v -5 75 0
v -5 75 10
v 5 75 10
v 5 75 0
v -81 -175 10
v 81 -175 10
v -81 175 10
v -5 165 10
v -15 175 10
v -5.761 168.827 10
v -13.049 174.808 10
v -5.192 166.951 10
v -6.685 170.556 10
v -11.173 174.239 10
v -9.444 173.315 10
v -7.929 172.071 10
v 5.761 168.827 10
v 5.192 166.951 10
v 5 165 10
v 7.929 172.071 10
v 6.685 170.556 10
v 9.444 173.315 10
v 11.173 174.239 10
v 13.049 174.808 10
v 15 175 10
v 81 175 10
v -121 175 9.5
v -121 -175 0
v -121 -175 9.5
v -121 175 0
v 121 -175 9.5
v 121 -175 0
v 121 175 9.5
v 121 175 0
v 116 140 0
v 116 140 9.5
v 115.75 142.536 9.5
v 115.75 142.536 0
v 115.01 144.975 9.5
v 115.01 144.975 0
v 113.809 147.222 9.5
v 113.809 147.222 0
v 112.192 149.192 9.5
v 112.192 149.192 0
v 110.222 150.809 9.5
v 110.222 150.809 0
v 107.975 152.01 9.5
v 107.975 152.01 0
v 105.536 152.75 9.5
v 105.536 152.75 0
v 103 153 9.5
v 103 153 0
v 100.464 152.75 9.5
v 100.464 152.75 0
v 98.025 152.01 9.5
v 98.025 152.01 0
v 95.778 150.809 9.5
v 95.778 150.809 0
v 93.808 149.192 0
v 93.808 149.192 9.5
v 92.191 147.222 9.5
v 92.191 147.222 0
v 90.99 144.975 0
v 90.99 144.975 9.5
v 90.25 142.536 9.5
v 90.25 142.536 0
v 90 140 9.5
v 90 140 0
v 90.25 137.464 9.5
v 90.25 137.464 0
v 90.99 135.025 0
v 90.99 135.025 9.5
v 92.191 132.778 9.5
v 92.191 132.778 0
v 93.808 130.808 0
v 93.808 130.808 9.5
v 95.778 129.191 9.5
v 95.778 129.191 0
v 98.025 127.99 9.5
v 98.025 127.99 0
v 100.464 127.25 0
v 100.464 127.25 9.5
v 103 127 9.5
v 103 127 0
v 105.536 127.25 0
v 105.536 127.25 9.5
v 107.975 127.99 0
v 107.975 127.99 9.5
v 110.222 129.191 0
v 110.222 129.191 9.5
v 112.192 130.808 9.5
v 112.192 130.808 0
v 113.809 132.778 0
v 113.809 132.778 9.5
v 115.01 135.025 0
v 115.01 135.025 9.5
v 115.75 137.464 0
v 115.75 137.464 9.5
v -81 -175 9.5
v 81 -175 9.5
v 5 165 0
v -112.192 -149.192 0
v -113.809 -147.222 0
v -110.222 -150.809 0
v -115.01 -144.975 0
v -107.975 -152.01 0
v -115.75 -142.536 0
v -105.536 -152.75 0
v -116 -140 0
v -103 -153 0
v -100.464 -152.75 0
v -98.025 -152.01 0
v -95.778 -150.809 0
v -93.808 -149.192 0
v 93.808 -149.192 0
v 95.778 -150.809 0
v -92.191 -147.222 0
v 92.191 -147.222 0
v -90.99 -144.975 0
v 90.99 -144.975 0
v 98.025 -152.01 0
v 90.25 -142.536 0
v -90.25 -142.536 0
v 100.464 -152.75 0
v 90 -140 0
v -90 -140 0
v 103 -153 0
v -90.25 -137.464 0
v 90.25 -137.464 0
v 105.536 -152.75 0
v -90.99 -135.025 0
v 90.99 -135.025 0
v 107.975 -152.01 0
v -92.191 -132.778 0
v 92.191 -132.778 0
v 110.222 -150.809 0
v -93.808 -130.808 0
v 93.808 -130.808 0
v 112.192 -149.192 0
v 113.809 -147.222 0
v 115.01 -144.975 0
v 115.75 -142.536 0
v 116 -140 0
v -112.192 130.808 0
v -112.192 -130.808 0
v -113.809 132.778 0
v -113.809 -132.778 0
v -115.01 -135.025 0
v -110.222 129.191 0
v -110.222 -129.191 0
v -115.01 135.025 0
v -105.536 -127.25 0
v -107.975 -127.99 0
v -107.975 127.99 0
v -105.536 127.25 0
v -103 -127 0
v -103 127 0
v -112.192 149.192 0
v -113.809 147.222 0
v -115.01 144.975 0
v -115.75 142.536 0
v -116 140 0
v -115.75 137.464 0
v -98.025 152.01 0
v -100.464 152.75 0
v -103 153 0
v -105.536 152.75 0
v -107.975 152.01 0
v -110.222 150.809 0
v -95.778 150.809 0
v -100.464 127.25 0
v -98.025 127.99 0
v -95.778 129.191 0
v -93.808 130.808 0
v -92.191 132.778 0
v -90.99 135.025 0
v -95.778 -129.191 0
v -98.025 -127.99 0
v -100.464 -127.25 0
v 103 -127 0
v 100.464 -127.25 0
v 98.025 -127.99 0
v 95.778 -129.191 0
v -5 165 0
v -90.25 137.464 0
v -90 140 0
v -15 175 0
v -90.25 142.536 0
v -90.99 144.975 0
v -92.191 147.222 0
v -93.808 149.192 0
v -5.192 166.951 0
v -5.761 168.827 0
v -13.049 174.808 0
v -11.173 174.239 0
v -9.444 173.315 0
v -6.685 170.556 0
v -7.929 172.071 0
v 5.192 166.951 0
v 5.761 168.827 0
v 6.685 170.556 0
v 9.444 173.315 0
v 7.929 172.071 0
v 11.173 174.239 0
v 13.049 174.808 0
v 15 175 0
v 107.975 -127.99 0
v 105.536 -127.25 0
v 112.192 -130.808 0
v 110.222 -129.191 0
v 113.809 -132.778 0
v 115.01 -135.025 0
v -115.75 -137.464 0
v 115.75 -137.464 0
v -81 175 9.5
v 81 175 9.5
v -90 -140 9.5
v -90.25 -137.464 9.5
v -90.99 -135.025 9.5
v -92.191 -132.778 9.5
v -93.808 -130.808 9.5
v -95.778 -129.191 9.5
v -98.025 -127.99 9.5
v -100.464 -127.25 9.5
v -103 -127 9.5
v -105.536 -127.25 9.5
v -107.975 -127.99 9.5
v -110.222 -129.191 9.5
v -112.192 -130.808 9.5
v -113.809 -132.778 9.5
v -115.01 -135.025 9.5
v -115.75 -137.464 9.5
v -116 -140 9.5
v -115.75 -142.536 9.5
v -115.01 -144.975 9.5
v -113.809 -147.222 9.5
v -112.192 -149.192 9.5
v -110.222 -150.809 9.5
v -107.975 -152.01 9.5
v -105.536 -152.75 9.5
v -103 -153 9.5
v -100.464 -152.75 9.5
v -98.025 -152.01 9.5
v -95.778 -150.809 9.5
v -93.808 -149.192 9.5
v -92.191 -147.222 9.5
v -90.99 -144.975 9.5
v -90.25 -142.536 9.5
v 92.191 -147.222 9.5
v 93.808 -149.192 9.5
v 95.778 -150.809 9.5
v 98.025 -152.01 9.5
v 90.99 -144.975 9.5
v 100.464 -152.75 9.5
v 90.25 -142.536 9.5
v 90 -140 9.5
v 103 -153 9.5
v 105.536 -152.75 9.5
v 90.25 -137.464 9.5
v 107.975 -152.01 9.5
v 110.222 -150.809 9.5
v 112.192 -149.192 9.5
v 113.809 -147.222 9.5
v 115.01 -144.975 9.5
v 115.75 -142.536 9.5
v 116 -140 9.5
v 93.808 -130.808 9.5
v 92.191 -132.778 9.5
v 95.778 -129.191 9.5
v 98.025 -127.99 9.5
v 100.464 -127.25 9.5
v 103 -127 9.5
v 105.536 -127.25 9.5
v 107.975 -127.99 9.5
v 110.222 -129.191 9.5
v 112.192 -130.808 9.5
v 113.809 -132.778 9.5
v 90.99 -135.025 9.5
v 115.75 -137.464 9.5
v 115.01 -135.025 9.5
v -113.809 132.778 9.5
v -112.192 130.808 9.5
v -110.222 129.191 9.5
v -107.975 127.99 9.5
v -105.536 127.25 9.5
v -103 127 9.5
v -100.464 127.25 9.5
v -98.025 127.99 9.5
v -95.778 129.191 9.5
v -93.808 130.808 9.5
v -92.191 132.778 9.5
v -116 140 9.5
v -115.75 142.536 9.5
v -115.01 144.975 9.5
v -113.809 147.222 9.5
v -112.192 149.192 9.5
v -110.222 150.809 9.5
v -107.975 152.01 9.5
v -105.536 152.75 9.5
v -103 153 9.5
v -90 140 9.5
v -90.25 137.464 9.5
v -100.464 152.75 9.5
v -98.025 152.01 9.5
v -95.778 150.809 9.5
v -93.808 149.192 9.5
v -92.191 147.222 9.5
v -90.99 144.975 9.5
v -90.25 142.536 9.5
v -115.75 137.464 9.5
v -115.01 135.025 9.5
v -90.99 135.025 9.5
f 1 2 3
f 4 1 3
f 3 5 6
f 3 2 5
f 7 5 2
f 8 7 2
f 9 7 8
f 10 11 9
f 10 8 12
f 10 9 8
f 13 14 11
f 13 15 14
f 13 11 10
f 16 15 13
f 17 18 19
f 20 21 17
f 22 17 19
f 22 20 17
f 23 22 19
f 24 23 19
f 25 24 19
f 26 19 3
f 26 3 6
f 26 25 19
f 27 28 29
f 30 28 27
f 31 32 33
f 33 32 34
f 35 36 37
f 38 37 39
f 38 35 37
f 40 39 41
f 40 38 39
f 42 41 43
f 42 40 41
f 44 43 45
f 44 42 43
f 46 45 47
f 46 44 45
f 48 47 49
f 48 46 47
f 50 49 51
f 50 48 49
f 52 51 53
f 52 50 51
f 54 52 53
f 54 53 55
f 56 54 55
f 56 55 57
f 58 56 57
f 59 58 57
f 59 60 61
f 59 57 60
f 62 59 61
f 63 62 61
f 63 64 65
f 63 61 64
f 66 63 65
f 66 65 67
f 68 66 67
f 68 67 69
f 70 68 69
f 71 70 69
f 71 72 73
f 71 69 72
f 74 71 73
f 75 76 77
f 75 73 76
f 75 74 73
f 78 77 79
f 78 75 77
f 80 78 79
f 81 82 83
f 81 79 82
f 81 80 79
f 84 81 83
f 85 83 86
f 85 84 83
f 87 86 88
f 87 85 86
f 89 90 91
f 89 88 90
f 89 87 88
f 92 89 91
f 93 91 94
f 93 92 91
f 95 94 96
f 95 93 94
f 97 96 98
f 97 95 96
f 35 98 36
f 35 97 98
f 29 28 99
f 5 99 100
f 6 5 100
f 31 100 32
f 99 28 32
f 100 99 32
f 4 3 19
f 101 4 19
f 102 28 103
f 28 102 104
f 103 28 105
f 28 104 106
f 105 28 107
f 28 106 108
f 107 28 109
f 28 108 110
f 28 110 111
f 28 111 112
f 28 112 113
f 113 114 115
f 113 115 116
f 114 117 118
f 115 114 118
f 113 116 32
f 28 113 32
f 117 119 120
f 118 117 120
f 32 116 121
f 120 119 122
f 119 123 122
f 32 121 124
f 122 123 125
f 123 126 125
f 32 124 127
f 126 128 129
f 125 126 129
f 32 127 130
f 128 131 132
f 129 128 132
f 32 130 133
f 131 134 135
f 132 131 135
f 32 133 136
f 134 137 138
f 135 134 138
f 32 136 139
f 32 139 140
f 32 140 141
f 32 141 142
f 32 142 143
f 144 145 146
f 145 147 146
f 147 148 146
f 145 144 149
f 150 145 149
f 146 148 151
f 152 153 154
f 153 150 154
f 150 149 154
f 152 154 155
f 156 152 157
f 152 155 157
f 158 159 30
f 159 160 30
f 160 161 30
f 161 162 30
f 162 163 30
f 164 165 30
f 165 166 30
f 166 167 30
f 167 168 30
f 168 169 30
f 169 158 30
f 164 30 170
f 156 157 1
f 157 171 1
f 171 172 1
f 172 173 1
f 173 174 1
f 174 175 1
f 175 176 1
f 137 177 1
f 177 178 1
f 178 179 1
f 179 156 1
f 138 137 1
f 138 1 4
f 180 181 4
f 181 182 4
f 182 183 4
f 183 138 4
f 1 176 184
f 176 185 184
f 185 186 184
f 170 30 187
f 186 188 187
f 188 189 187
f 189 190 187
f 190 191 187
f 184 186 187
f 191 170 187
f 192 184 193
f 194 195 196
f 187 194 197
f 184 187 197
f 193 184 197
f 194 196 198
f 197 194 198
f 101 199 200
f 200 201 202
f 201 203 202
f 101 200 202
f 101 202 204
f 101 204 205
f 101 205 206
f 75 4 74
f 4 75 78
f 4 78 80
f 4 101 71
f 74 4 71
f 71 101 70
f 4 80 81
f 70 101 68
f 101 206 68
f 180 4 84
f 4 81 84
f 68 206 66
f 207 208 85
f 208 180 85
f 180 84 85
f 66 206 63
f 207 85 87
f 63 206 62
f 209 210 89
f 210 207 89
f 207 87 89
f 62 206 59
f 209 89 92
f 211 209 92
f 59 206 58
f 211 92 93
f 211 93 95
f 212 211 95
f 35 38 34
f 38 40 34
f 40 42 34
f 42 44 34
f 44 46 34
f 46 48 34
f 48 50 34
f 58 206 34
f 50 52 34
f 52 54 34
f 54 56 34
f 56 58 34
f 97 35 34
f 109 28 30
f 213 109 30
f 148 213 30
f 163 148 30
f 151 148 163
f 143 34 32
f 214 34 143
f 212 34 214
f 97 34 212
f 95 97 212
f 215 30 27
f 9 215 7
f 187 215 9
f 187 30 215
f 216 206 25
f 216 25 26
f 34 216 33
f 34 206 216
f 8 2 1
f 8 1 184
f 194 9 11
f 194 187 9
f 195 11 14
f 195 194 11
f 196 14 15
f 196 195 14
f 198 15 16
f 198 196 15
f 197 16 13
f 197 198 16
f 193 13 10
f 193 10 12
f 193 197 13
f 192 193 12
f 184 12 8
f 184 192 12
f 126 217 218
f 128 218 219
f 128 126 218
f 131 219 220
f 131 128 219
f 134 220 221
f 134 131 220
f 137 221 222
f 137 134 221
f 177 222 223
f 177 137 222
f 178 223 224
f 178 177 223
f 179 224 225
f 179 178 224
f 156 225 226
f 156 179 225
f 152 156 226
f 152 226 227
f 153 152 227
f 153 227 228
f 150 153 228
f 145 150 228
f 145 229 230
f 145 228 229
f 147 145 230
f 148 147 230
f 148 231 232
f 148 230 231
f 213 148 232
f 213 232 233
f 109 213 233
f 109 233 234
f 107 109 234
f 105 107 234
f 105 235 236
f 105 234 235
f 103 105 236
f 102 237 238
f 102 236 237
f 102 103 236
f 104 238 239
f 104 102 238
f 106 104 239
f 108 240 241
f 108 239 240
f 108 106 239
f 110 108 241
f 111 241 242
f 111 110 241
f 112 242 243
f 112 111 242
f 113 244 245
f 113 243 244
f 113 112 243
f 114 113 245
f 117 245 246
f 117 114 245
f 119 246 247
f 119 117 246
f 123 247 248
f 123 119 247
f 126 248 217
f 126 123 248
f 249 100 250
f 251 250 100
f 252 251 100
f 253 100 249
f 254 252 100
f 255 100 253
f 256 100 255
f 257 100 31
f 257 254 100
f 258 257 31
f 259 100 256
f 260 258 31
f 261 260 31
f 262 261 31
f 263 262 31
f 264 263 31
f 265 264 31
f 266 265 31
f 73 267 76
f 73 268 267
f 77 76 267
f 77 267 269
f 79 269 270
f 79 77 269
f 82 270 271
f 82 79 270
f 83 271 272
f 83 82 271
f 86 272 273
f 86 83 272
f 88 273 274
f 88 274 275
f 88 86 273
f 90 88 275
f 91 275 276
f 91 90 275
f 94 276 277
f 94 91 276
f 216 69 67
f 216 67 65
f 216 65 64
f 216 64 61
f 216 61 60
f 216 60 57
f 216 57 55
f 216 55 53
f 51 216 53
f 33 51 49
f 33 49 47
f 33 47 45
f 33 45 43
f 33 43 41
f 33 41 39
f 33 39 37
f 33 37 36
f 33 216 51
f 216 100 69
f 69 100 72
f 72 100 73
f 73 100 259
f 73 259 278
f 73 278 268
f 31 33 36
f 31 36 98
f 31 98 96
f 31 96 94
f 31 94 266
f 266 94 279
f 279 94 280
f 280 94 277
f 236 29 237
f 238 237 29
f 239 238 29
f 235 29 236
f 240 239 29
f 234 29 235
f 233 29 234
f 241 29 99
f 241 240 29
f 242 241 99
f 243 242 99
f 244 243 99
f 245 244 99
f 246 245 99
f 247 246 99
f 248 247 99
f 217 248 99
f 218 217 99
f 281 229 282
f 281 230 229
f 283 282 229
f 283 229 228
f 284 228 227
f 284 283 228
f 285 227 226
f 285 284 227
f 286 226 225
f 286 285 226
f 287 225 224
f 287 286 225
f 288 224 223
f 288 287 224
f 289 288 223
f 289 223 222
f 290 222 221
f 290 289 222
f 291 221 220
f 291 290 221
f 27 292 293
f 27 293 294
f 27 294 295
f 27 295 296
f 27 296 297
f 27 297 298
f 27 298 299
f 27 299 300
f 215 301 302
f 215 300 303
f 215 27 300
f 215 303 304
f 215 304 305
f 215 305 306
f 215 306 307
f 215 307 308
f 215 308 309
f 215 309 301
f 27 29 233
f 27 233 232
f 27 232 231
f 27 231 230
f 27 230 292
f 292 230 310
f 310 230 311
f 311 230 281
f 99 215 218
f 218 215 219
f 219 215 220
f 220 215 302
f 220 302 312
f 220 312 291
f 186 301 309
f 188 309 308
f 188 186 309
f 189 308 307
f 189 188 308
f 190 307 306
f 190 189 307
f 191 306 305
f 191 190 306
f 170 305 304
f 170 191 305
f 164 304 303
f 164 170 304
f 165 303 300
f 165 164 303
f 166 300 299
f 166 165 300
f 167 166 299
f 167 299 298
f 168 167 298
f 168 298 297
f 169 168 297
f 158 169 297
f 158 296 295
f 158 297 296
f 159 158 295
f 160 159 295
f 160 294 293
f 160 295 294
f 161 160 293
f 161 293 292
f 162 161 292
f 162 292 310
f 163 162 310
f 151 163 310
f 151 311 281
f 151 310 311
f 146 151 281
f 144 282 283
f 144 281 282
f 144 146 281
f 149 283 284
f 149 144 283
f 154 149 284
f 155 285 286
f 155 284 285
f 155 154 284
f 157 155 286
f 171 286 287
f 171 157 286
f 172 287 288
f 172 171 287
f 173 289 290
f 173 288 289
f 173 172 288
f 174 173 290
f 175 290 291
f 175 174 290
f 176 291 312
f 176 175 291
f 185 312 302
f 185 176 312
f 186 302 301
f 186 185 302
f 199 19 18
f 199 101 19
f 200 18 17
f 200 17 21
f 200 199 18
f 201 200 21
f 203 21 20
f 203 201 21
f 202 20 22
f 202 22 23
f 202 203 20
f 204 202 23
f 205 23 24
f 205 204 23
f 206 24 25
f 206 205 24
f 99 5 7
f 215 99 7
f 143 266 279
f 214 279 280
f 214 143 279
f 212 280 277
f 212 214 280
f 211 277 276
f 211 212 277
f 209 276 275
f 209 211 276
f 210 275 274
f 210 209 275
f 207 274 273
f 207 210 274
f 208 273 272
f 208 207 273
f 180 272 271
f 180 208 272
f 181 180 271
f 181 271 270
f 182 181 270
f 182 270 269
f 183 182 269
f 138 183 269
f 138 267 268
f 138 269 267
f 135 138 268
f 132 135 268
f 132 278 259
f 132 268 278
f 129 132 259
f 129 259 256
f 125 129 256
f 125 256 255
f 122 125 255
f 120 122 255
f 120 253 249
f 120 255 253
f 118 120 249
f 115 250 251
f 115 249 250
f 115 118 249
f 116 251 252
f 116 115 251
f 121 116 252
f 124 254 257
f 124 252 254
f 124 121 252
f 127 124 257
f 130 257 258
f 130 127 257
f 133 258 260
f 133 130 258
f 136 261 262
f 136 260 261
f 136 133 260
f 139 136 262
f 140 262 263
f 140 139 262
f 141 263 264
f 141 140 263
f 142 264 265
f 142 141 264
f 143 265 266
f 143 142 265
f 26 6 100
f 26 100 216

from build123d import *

# Parameters (mm, degrees)
SKETCH1_W           = 242
SKETCH1_H           = 350
SKETCH1_R           = 13
BOSS_EXTRUDE1_DEPTH = 10
SKETCH2_W           = 40
SKETCH2_H           = 350
CUT_EXTRUDE1_DEPTH  = 0.5
SKETCH3_W           = 10
SKETCH3_H           = 100
CUT_EXTRUDE2_DEPTH  = 11
FILLET1_R           = 10


with BuildPart() as part:
    # Sketch1 → Boss-Extrude1 (new body)
    with BuildSketch(Plane.XY):
        Rectangle(SKETCH1_W, SKETCH1_H)
        with Locations((-103, 140)):
            Circle(SKETCH1_R, mode=Mode.SUBTRACT)
        with Locations((-103, -140)):
            Circle(SKETCH1_R, mode=Mode.SUBTRACT)
        with Locations((103, 140)):
            Circle(SKETCH1_R, mode=Mode.SUBTRACT)
        with Locations((103, -140)):
            Circle(SKETCH1_R, mode=Mode.SUBTRACT)
    extrude(amount=BOSS_EXTRUDE1_DEPTH)

    # Sketch2 → Cut-Extrude1 (cut)
    with BuildSketch(Plane.XY.offset(10)):
        with Locations((-101, 0)):
            Rectangle(SKETCH2_W, SKETCH2_H)
        with Locations((101, 0)):
            Rectangle(SKETCH2_W, SKETCH2_H)
    extrude(amount=-CUT_EXTRUDE1_DEPTH, mode=Mode.SUBTRACT)

    # Sketch3 → Cut-Extrude2 (cut, through all)
    with BuildSketch(Plane.XY.offset(10)):
        with Locations((0, 125)):
            Rectangle(SKETCH3_W, SKETCH3_H)
    extrude(amount=-CUT_EXTRUDE2_DEPTH, mode=Mode.SUBTRACT)

    # Fillet1
    fillet1_edges = [part.edges().sort_by_distance(p)[0] for p in [
        (5, 175, 5),
        (-5, 175, 5),
    ]]
    fillet(fillet1_edges, radius=FILLET1_R)


solid = part.part
